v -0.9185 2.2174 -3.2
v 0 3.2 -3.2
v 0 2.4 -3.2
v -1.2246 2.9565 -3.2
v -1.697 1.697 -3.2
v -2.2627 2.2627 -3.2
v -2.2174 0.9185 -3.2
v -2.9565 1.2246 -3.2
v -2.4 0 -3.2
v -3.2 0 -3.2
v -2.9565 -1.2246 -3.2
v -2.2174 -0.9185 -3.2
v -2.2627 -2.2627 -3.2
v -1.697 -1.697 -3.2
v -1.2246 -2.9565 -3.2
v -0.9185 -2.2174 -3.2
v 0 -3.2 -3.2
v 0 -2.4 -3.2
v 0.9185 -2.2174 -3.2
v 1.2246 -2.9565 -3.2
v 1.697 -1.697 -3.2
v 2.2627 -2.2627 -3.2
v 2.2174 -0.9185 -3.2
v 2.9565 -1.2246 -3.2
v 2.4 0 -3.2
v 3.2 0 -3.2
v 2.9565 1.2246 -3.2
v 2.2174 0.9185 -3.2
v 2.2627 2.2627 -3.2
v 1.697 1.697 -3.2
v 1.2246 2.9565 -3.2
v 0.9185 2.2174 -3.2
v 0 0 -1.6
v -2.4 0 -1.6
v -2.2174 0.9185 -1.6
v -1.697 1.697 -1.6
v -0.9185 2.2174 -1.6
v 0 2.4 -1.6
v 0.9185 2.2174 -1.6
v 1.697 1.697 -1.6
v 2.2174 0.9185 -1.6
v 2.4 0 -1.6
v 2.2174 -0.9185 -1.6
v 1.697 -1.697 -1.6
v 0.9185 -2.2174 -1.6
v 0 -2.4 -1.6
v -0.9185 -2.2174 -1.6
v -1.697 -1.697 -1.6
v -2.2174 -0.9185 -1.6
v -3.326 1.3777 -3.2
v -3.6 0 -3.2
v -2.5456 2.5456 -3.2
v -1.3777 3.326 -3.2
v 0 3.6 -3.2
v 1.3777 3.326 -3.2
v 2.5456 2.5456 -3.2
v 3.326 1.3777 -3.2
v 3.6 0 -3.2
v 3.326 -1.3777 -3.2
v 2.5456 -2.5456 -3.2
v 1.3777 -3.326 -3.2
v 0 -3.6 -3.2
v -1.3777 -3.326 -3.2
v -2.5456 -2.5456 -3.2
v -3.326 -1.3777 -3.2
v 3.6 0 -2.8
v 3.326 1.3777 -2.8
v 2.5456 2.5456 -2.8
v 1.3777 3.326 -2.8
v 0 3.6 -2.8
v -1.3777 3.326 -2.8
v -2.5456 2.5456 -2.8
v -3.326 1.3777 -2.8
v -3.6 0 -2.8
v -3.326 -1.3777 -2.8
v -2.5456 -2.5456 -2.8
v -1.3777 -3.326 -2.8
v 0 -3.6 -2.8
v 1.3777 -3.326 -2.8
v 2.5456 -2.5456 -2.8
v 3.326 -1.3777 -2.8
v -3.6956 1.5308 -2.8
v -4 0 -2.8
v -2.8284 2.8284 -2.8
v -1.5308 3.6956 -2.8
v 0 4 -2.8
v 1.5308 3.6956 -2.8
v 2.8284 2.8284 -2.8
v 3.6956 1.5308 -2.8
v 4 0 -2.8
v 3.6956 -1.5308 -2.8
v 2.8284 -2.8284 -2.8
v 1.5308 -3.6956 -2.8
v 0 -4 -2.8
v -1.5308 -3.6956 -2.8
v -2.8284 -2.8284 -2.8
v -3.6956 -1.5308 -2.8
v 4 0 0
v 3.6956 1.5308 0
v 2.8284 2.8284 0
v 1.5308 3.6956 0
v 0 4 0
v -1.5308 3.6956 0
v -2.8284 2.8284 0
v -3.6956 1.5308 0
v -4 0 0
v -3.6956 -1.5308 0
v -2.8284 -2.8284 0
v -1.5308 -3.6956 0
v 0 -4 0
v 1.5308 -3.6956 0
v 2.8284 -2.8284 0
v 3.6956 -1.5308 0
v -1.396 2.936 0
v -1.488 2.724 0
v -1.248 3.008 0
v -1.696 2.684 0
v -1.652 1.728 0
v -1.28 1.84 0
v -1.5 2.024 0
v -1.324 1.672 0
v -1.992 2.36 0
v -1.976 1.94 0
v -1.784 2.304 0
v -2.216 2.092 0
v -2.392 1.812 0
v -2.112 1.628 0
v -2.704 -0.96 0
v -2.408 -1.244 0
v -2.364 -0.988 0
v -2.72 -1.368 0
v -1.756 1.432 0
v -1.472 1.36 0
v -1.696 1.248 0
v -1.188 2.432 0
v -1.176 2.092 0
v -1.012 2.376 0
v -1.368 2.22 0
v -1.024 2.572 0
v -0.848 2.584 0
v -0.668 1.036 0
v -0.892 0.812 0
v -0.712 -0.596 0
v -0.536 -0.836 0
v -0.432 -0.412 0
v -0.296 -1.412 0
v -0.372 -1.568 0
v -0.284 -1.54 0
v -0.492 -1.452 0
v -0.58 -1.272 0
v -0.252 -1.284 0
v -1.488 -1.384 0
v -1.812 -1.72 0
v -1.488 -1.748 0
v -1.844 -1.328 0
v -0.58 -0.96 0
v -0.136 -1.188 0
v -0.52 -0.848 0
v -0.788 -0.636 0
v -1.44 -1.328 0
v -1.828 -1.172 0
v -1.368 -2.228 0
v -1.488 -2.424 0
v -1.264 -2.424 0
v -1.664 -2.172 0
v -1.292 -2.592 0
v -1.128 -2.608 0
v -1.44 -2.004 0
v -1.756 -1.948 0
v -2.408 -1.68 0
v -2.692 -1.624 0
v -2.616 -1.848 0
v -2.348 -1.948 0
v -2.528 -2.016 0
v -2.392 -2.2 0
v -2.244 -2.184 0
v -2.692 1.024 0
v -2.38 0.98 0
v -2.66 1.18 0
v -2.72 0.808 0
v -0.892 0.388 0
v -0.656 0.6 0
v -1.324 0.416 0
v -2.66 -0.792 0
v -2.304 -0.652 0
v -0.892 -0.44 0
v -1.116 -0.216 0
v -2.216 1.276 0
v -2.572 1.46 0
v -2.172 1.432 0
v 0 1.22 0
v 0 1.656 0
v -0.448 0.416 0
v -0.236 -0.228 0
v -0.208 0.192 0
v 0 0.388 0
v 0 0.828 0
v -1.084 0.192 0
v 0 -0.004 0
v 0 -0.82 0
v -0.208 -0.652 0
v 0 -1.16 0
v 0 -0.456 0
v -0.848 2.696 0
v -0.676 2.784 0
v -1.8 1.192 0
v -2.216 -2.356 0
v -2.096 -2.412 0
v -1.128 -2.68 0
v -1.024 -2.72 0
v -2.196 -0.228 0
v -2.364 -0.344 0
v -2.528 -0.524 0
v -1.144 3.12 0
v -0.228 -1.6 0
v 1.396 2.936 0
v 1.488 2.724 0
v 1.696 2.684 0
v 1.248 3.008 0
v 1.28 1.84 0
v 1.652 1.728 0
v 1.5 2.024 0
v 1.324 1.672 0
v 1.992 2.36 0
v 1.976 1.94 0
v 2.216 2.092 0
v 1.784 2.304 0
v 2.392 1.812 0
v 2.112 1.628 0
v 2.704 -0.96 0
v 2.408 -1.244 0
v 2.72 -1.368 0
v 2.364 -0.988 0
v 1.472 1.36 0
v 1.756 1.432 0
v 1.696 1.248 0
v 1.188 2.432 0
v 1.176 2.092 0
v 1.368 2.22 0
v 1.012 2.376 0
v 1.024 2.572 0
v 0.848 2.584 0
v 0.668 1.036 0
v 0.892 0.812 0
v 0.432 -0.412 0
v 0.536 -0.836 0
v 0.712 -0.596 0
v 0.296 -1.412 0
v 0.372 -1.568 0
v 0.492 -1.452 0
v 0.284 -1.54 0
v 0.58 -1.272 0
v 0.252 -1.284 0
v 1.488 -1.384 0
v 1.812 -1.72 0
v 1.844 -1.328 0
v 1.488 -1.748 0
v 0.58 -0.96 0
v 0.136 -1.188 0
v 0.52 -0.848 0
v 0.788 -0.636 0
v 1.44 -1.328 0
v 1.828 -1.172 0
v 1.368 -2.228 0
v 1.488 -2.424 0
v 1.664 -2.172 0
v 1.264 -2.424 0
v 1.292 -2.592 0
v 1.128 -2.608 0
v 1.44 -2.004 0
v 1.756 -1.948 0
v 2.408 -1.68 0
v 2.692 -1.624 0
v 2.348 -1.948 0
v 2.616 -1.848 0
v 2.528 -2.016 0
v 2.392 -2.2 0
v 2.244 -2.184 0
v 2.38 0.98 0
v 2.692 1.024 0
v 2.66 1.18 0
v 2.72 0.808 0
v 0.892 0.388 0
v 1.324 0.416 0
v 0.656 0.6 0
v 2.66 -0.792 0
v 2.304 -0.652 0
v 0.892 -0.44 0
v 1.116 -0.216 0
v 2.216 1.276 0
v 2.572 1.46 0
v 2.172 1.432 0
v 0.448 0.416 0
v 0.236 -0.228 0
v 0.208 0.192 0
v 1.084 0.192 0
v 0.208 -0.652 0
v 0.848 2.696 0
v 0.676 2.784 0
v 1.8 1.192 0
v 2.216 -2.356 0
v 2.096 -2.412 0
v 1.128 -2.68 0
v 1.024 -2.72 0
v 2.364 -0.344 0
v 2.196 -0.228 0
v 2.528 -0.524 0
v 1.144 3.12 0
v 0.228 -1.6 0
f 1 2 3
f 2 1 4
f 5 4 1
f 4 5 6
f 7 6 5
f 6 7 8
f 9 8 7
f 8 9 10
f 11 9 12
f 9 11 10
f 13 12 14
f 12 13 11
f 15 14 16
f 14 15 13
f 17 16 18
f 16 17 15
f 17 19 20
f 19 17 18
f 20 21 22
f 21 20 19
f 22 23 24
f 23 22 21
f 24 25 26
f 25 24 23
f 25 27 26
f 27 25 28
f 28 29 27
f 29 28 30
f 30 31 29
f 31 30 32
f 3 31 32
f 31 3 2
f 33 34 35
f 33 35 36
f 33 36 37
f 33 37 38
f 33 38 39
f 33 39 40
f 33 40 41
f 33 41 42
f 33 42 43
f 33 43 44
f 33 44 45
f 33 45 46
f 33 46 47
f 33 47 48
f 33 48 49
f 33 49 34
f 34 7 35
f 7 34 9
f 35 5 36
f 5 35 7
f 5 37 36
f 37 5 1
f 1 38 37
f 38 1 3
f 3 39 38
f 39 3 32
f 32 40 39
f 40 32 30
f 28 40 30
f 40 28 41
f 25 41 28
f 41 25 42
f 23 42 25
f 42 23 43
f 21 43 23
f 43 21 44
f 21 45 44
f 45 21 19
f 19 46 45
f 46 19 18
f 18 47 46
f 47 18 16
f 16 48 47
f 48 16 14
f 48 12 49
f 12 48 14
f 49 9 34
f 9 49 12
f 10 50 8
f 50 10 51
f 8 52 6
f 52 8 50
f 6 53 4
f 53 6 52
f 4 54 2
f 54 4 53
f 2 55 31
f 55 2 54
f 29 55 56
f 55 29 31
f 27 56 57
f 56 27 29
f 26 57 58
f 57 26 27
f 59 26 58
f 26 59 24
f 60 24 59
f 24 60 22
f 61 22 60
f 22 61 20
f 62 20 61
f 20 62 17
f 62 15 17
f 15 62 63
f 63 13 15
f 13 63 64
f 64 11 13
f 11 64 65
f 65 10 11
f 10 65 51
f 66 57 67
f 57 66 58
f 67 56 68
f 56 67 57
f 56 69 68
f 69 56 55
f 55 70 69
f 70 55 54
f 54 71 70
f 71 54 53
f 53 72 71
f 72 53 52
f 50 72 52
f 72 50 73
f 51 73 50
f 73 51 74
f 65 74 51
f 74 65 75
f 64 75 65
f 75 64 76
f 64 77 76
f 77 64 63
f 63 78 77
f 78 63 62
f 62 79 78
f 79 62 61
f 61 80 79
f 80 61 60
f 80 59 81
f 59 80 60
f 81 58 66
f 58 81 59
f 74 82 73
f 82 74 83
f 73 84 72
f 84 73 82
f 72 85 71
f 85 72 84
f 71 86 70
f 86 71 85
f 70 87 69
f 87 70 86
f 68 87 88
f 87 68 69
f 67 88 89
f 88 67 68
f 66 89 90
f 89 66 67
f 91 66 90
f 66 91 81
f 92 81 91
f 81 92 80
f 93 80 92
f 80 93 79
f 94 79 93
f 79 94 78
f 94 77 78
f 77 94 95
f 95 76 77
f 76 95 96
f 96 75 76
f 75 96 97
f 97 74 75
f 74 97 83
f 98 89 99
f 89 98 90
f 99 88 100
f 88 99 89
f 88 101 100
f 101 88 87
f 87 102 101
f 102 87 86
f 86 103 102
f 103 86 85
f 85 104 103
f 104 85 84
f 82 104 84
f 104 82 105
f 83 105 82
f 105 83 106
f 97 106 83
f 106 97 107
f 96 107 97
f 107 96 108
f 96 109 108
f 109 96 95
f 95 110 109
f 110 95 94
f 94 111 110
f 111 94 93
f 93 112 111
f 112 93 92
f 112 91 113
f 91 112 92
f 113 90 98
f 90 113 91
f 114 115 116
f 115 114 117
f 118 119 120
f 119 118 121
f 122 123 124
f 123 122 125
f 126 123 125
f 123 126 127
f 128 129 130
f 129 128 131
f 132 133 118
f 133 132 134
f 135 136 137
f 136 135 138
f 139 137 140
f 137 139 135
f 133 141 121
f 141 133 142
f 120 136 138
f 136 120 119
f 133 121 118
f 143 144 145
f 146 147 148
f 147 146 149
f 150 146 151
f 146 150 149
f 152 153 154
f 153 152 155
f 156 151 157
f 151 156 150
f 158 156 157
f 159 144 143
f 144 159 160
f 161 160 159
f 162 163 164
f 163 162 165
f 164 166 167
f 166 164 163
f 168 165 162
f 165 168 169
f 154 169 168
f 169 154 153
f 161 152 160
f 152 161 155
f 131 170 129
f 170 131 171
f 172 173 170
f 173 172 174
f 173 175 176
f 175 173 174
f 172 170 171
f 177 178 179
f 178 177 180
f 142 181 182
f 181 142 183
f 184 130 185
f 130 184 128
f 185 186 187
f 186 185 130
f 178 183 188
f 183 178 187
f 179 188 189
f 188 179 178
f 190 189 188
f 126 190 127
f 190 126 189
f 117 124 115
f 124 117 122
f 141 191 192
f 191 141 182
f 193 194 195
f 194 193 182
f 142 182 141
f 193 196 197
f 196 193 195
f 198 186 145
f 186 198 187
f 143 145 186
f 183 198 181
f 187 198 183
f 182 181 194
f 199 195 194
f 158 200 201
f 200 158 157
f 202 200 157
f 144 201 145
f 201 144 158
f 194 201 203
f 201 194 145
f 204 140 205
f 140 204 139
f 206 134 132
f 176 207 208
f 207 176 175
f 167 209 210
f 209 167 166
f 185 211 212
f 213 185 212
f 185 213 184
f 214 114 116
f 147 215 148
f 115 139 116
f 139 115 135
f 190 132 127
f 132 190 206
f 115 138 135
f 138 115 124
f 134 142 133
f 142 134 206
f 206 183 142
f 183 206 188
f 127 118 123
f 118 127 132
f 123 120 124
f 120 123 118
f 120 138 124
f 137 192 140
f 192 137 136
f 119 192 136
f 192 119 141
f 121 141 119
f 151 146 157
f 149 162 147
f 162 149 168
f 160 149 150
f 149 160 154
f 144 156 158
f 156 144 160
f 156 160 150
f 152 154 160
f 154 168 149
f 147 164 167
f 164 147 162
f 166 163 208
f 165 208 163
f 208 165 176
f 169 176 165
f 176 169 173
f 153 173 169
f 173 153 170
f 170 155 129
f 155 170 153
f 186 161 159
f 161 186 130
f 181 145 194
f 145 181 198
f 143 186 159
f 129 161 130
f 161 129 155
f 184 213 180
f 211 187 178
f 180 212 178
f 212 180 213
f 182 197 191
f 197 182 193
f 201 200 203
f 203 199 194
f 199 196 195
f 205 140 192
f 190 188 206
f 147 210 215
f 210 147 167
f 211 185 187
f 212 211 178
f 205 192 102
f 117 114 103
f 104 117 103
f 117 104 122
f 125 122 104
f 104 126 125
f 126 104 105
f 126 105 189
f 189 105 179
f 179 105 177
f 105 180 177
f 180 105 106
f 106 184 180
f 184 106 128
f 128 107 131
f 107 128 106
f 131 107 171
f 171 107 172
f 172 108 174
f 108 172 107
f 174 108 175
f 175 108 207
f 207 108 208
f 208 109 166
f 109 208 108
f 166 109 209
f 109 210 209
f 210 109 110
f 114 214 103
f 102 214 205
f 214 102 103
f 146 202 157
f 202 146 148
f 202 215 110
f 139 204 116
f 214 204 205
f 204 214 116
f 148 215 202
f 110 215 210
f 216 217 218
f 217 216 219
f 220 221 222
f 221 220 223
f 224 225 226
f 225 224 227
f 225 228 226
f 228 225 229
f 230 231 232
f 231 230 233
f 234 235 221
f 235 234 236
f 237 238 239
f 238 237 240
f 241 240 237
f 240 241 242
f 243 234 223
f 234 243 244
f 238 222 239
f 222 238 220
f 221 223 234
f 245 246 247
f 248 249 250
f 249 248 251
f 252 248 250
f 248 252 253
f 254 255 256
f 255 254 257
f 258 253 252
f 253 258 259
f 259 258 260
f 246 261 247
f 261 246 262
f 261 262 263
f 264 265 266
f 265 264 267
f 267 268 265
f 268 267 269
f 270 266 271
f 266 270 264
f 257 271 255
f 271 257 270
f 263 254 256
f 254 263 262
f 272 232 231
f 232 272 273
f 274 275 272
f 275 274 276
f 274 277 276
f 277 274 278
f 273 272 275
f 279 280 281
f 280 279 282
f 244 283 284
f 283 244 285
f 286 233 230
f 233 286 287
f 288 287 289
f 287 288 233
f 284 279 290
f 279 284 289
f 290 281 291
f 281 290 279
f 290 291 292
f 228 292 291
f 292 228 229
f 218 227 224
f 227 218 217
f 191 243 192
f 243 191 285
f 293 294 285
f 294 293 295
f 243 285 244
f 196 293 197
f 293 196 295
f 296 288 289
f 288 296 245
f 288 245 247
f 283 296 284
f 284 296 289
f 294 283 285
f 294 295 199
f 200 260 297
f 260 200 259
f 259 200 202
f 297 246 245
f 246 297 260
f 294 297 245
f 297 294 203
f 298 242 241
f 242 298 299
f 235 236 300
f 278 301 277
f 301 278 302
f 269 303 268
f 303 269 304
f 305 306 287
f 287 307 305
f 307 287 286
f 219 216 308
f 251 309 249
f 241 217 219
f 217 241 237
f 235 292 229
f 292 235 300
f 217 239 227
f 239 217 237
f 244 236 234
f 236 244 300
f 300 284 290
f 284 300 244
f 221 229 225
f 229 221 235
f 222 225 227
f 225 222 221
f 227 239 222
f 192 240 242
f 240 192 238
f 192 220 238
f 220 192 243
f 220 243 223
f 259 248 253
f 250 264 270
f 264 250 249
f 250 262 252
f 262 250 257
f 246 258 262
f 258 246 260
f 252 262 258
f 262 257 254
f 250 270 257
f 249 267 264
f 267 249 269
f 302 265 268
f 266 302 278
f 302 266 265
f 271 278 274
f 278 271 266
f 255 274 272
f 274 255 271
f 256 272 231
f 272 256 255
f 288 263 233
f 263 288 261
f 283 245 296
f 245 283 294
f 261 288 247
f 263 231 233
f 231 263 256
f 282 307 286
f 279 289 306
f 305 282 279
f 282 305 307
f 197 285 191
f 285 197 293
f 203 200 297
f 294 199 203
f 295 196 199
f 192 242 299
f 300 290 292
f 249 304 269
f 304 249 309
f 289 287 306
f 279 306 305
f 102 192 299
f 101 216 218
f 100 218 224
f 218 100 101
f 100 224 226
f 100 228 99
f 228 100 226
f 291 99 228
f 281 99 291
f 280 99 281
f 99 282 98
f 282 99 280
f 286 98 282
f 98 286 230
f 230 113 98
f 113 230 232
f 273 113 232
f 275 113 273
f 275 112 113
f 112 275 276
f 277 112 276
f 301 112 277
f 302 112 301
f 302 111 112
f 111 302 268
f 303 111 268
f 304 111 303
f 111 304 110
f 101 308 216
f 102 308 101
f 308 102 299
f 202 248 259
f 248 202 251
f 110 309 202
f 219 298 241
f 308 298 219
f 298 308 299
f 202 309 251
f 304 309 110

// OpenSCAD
use <../lib.scad>
use <../p/4-4ering.scad>
use <s/98138p45s01.scad>
use <s/98138s02.scad>
function ldraw_lib__98138p45() = [
// 0 Tile  1 x  1 Round with Lime Spider Pattern
// 0 Name: 98138p45.dat
// 0 Author: Peter Grass [Evilspyre]
// 0 !LDRAW_ORG Part UPDATE 2026-02
// 0 !LICENSE Licensed under CC BY 4.0 : see CAreadme.txt
// 
// 0 BFC CERTIFY CCW
  [0,"BFC","CERTIFY"],
  [0,"BFC","CCW"],
// 
// 0 !KEYWORDS Bricklink 98138pb185, Brickowl 585522, Brickset 76836, Monkie Kid
// 0 !KEYWORDS Rebrickable 98138pr9987, Set 80018, Set 80020, Set 80021, Set 80022
// 0 !KEYWORDS Set 80023, Set 80025, Set 80036
// 
// 0 !HISTORY 2026-03-06 [OrionP] Official Update 2026-02
// 
// 1 16 0 0 0 1 0 0 0 1 0 0 0 1 s\98138s02.dat
  [1,16,0,0,0,1,0,0,0,1,0,0,0,1, ldraw_lib__s__98138s02()],
// 1 16 0 0 0 10 0 0 0 1 0 0 0 10 4-4ering.dat
  [1,16,0,0,0,10,0,0,0,1,0,0,0,10, ldraw_lib__4_4ering()],
// 1 16 0 0 0 1 0 0 0 1 0 0 0 1 s\98138p45s01.dat
  [1,16,0,0,0,1,0,0,0,1,0,0,0,1, ldraw_lib__s__98138p45s01()],
// 1 16 0 0 0 -1 0 0 0 1 0 0 0 1 s\98138p45s01.dat
  [1,16,0,0,0,-1,0,0,0,1,0,0,0,1, ldraw_lib__s__98138p45s01()],
];
module ldraw_lib__98138p45(step=0, col=false, unit=2/5, alt=false, line=0.2, solid=!$preview)
    makepoly(ldraw_lib__98138p45(), step=step, col=col, unit=unit, alt=alt, line=line, solid=solid);
ldraw_lib__98138p45(line=0.2);
